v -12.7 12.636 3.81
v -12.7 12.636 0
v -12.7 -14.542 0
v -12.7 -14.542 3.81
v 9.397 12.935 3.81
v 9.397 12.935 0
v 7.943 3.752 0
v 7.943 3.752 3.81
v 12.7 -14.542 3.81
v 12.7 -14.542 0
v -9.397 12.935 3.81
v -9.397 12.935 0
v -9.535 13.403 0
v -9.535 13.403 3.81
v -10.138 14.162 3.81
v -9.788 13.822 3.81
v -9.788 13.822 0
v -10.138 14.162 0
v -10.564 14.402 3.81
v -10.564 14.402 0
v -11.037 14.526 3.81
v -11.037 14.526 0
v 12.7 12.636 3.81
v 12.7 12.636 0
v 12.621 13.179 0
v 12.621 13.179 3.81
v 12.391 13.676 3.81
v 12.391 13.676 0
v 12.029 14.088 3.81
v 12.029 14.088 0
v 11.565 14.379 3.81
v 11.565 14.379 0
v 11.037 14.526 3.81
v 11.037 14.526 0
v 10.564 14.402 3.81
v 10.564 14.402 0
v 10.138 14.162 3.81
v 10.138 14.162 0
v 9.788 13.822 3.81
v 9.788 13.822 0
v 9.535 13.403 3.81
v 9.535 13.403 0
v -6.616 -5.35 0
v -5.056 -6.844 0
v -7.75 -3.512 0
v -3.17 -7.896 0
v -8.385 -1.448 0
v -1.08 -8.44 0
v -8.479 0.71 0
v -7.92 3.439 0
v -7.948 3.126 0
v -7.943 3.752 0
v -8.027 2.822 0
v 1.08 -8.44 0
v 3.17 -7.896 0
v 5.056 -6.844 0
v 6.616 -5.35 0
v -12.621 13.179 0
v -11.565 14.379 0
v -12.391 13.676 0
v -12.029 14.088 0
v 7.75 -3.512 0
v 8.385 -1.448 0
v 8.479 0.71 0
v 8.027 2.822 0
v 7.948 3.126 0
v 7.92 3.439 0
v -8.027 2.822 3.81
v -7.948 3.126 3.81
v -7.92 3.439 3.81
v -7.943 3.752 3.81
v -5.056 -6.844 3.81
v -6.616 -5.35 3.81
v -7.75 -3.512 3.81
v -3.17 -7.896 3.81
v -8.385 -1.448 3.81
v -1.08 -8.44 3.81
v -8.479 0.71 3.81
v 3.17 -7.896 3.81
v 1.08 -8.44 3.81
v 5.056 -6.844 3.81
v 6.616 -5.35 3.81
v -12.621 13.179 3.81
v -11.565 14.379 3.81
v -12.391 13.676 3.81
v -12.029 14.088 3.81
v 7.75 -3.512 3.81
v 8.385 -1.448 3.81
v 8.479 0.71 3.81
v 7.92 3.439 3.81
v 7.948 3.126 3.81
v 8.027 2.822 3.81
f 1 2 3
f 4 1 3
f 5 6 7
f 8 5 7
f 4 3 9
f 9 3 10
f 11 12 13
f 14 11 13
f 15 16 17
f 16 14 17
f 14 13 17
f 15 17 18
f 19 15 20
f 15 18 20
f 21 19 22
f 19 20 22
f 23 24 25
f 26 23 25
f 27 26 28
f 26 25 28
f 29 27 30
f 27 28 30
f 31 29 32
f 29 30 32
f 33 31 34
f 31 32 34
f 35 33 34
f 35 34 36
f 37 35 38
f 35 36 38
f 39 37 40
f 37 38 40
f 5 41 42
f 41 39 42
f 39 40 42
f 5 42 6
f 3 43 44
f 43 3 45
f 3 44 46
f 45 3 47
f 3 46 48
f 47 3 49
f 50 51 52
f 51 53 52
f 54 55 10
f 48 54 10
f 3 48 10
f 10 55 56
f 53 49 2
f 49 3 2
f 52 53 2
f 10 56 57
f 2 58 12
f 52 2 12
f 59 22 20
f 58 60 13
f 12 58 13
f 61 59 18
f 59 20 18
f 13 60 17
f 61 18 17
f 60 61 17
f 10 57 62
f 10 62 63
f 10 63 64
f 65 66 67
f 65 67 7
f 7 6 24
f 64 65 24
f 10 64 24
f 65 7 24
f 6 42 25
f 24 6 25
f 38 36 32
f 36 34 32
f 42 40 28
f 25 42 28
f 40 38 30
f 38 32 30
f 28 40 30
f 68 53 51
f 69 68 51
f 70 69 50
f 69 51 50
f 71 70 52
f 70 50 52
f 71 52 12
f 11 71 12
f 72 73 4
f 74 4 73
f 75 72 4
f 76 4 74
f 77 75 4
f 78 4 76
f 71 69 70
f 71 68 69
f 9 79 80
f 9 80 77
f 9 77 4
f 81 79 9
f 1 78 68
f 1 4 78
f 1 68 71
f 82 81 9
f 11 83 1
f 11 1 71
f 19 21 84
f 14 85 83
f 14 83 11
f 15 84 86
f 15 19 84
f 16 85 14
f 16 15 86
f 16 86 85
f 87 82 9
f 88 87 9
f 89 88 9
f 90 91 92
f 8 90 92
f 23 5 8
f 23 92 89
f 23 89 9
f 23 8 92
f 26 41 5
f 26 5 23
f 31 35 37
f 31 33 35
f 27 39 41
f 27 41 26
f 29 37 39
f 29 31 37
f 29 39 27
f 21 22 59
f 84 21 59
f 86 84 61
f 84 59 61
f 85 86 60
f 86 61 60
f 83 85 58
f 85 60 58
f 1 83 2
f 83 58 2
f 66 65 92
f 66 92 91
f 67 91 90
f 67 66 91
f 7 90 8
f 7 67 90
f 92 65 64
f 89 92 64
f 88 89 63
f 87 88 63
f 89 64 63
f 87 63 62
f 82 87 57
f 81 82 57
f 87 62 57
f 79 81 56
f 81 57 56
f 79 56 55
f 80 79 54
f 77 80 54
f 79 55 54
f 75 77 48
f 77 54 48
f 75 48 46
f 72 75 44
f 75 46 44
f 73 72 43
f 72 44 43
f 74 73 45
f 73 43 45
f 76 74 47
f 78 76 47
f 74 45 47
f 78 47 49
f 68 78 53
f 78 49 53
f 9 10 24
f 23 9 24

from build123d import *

# Parameters (mm, degrees)
F1_DEPTH    = 3.81
F2_T1_DEPTH = 11.945118529
F2_T3_DEPTH = 13.335
F2_T5_DEPTH = 6.3475490509


# Not quite as in the source:
# - a fillet or chamfer that OpenCascade refuses, or shapes differently, is made with other operations: its cross-section is extruded or revolved along the edge and cut away or added


with BuildPart() as f1:
    # F0 (on Top) → F1 (new body)
    with BuildSketch(Plane.XY):
        with BuildLine():
            ThreePointArc((7.8636785966, 3.2504830303), (0, -8.509), (-7.8636785966, 3.2504830303))
            Line((-7.8636785966, 3.2504830303), (-9.652, 14.5415))
            Line((-9.652, 14.5415), (-12.7, 14.5415))
            Line((-12.7, 14.5415), (-12.7, -14.5415))
            Line((-12.7, -14.5415), (12.7, -14.5415))
            Line((12.7, -14.5415), (12.7, 14.5415))
            Line((12.7, 14.5415), (9.652, 14.5415))
            Line((9.652, 14.5415), (7.8636785966, 3.2504830303))
        make_face()
    extrude(amount=F1_DEPTH)

    # F2: fillet of radius 1.905 on 6 edges, made by hand

    # F2_s2 → F2_t1 (cut)
    with BuildSketch(Plane.XY.offset(-4.0675592645)):
        with BuildLine():
            ThreePointArc((-9.397477417, 12.9345076559), (-10.0418251737, 14.0850733645), (-11.2790237058, 14.5415))
            Line((-11.2790237058, 14.5415), (-9.652, 14.5415))
            Line((-9.652, 14.5415), (-9.397477417, 12.9345076559))
        make_face()
        with BuildLine():
            ThreePointArc((11.2790237058, 14.5415), (10.0418251737, 14.0850733645), (9.397477417, 12.9345076559))
            Line((9.397477417, 12.9345076559), (9.652, 14.5415))
            Line((9.652, 14.5415), (11.2790237058, 14.5415))
        make_face()
    extrude(amount=F2_T1_DEPTH, mode=Mode.SUBTRACT)

    # F2_s4 → F2_t3 (cut)
    with BuildSketch(Plane.XY.offset(-4.7625)):
        with BuildLine():
            ThreePointArc((-10.795, 14.5415), (-12.1420384182, 13.9835384182), (-12.7, 12.6365))
            Line((-12.7, 12.6365), (-12.7, 14.5415))
            Line((-12.7, 14.5415), (-10.795, 14.5415))
        make_face()
        with BuildLine():
            ThreePointArc((12.7, 12.6365), (12.1420384182, 13.9835384182), (10.795, 14.5415))
            Line((10.795, 14.5415), (12.7, 14.5415))
            Line((12.7, 14.5415), (12.7, 12.6365))
        make_face()
    extrude(amount=F2_T3_DEPTH, mode=Mode.SUBTRACT)

    # F2_s6 → F2_t5 (cut)
    with BuildSketch(Plane.XY.offset(-1.2687745255)):
        with BuildLine():
            ThreePointArc((-8.0274308907, 2.821955757), (-7.9274098449, 3.2816022158), (-7.9430706222, 3.7517445525))
            Line((-7.9430706222, 3.7517445525), (-7.8636785966, 3.2504830303))
            ThreePointArc((-7.8636785966, 3.2504830303), (-7.9484431866, 3.0373231487), (-8.0274308907, 2.821955757))
        make_face()
        with BuildLine():
            ThreePointArc((8.0274308907, 2.821955757), (7.9274098449, 3.2816022158), (7.9430706222, 3.7517445525))
            Line((7.9430706222, 3.7517445525), (7.8636785966, 3.2504830303))
            ThreePointArc((7.8636785966, 3.2504830303), (7.9484431866, 3.0373231487), (8.0274308907, 2.821955757))
        make_face()
    extrude(amount=F2_T5_DEPTH, mode=Mode.SUBTRACT)


solid = f1.part
